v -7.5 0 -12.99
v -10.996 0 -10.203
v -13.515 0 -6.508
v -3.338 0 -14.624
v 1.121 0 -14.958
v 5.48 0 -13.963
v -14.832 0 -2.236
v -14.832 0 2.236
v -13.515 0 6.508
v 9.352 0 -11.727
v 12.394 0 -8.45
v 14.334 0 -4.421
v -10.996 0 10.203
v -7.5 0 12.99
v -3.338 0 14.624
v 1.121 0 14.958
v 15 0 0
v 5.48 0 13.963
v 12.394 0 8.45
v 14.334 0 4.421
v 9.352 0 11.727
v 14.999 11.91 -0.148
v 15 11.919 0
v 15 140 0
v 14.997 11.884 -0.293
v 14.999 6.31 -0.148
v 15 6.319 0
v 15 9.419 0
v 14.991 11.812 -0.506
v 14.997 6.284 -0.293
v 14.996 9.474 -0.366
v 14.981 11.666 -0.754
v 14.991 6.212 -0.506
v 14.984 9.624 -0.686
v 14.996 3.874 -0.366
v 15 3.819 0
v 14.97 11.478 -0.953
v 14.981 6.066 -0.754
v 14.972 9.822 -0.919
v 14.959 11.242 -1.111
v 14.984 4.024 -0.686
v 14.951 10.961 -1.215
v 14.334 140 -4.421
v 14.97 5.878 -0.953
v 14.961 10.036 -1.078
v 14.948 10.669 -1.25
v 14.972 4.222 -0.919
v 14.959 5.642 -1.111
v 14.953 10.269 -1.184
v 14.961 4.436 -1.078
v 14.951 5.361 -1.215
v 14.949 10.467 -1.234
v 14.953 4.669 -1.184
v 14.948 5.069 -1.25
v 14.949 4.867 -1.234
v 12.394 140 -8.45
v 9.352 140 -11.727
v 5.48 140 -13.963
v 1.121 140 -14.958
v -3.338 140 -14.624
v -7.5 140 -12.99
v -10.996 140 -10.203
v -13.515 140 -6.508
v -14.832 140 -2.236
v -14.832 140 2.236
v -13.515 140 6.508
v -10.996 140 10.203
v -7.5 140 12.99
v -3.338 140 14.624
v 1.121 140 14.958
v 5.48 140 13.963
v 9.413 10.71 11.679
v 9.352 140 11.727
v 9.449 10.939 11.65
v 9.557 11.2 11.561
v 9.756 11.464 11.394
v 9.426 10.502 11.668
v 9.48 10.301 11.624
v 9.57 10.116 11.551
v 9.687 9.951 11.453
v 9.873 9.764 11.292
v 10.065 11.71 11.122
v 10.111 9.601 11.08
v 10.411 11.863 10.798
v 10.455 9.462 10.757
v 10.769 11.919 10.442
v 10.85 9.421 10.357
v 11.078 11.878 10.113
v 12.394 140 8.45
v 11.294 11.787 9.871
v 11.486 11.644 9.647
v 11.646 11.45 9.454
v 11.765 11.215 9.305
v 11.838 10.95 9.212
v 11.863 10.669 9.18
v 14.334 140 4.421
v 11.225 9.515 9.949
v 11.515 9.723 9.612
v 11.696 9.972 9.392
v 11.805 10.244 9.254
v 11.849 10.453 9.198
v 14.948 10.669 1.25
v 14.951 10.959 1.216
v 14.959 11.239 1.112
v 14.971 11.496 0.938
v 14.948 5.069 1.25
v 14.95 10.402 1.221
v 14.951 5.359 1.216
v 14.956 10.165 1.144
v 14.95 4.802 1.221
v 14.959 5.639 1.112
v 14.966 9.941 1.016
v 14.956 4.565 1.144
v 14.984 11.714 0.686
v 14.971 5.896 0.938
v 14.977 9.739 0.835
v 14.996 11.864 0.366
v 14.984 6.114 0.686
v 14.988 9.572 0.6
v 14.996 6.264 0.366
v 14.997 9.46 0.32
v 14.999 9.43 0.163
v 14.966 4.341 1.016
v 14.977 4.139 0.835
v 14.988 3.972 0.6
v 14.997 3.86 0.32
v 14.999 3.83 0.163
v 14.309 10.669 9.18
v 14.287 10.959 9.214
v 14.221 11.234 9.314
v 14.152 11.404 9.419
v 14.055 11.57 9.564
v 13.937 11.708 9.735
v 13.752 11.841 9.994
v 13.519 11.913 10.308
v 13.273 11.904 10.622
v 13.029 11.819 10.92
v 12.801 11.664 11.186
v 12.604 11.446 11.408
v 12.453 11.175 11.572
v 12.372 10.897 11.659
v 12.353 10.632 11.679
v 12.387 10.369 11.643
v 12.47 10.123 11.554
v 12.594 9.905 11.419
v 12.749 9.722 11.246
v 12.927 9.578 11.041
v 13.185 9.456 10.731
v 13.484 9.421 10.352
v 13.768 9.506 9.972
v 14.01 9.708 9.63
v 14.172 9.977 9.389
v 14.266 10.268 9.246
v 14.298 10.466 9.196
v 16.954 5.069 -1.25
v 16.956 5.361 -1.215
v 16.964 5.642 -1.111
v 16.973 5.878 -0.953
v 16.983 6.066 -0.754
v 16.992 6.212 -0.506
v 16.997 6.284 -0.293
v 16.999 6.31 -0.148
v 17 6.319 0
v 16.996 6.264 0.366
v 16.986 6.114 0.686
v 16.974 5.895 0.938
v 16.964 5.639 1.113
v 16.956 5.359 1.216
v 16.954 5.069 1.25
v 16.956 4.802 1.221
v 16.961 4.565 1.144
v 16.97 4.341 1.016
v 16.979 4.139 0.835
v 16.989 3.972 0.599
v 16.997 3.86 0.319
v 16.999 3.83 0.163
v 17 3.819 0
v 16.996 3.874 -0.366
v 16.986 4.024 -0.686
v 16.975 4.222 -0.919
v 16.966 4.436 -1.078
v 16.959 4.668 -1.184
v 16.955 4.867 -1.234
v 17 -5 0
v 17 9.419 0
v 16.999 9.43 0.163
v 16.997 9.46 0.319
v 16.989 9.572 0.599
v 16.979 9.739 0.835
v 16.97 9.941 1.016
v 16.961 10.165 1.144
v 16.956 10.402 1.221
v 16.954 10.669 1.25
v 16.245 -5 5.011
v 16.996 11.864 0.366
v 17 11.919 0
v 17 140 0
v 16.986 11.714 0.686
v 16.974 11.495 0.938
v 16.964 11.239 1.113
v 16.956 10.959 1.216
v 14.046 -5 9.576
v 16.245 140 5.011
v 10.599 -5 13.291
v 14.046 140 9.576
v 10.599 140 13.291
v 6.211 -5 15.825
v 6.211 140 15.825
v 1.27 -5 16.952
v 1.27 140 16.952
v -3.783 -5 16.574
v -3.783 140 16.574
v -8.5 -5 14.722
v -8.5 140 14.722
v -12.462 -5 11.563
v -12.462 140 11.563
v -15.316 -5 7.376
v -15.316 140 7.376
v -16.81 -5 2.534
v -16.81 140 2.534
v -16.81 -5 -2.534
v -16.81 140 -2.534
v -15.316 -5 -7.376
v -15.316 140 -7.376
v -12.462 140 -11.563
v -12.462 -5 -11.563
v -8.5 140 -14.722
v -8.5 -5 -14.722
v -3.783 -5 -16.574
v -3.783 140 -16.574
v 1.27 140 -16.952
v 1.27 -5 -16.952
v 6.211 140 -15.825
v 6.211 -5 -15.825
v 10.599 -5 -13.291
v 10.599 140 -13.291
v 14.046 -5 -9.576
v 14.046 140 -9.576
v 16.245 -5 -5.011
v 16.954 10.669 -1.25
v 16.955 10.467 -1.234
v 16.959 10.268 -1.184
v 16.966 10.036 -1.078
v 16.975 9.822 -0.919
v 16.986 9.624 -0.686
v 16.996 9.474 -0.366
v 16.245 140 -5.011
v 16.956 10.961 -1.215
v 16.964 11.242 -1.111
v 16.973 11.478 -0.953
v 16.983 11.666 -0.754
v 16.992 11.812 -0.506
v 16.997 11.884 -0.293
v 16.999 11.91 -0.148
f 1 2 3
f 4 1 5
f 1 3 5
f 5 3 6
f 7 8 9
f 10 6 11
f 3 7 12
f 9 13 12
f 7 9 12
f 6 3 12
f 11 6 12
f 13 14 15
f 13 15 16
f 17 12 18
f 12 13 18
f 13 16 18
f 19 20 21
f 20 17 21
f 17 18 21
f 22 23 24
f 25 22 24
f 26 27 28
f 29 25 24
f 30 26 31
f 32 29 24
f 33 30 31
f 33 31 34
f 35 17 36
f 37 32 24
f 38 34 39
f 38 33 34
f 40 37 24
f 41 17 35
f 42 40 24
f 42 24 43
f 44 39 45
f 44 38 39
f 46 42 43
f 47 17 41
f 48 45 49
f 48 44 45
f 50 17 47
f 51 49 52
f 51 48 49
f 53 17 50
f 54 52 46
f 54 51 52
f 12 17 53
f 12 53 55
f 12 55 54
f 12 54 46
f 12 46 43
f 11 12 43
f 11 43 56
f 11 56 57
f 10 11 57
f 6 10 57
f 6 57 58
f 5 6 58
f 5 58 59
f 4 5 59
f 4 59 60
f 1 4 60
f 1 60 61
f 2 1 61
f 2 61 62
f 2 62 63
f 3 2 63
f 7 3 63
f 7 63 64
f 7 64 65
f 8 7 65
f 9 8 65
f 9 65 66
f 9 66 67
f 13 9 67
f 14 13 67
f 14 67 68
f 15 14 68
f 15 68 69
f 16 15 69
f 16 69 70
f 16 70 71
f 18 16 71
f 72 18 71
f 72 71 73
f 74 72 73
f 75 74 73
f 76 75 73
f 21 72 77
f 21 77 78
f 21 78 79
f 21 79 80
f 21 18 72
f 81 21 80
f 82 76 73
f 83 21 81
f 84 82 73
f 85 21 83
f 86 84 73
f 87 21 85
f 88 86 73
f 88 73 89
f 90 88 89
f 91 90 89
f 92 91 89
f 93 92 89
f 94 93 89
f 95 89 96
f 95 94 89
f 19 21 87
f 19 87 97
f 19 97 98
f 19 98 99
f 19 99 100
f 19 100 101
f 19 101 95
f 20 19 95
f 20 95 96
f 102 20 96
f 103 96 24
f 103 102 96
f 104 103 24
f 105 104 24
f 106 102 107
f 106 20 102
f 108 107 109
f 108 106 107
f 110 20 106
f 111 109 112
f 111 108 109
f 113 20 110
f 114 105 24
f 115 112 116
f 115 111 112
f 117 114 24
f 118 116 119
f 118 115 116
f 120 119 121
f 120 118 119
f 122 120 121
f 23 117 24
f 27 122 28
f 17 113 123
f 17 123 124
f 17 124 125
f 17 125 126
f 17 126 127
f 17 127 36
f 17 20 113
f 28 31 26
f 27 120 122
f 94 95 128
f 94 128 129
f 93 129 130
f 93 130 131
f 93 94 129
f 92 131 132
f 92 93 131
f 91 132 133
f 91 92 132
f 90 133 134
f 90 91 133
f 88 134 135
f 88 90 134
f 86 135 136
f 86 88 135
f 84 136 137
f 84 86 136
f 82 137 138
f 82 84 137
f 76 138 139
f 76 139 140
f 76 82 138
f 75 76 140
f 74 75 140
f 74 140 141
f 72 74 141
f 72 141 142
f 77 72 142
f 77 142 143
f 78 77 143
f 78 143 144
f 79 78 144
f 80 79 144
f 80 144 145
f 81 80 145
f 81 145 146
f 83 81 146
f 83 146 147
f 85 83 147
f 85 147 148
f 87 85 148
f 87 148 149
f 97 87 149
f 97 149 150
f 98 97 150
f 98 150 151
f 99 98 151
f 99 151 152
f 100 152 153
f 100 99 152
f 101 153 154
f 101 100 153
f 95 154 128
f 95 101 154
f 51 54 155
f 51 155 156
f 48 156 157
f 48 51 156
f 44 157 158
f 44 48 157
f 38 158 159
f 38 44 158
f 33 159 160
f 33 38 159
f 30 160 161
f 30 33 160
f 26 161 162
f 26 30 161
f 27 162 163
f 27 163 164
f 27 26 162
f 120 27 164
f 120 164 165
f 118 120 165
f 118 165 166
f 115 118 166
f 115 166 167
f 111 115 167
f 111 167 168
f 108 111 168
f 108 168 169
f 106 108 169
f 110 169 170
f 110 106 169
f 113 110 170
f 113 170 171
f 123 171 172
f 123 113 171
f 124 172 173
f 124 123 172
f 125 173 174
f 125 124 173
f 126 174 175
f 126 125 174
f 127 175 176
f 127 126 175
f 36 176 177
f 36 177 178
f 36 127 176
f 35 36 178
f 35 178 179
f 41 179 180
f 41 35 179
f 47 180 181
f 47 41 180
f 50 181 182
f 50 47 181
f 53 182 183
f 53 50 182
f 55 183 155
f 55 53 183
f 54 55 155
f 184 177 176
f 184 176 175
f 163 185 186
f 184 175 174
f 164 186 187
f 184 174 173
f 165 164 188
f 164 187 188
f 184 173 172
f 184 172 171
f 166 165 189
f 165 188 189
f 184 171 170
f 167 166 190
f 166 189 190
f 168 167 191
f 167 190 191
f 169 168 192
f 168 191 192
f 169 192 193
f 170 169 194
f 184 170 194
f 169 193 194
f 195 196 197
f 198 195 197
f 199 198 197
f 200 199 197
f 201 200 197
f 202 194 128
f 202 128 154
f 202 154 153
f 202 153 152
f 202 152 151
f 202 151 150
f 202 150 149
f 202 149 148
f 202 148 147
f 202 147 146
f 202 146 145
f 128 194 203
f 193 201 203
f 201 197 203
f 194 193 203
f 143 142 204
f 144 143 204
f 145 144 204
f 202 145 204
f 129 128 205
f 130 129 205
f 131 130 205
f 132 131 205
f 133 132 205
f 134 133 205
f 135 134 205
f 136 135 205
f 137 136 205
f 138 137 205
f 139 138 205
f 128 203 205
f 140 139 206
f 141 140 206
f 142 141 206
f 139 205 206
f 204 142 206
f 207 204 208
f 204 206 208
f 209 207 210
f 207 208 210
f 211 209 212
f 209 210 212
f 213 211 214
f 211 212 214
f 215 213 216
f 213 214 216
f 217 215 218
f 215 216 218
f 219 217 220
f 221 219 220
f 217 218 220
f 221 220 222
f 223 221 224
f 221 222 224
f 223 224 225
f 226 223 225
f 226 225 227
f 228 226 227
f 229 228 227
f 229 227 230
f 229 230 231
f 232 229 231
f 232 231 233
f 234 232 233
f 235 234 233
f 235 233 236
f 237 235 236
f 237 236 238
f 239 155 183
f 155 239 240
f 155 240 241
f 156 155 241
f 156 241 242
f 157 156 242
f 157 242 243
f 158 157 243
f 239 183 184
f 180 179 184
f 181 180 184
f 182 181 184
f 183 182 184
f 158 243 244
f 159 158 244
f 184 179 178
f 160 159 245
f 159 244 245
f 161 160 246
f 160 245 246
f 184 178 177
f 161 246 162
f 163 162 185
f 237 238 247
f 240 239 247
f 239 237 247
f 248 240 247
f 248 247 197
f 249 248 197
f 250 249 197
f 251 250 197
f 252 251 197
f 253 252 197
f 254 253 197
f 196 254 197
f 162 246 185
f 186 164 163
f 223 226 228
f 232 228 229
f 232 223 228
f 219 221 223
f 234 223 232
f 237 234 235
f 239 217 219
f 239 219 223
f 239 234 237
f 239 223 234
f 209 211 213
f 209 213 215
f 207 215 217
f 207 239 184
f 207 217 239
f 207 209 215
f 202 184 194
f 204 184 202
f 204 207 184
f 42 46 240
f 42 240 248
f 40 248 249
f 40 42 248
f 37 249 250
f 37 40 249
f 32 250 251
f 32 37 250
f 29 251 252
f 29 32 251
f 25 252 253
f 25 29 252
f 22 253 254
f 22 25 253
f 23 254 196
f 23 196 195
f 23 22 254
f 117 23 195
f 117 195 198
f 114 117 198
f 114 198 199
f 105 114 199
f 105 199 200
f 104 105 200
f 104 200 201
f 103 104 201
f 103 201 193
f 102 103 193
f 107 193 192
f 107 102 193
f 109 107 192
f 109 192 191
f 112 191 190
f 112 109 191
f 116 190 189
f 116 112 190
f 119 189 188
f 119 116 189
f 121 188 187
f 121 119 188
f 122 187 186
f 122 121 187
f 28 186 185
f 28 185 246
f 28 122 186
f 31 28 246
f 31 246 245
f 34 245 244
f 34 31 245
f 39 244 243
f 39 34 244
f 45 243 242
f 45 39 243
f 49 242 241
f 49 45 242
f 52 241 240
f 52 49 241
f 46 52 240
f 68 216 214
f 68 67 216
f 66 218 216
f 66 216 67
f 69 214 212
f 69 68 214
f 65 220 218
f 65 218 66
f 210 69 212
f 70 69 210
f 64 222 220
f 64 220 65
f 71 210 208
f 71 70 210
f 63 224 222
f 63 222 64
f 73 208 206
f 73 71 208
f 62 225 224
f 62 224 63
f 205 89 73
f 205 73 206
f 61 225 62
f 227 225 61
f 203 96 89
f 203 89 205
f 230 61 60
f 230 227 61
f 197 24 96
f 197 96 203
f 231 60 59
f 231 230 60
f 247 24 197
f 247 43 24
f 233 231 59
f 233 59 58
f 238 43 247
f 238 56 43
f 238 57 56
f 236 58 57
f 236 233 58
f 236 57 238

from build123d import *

# Parameters (mm, degrees)
SKETCH1_R           = 17
SKETCH1_R_2         = 15
BOSS_EXTRUDE1_DEPTH = 140
SKETCH2_R           = 17
BOSS_EXTRUDE2_DEPTH = 5
SKETCH3_R           = 1.25
CUT_EXTRUDE1_DEPTH  = 18


with BuildPart() as part:
    # Sketch1 → Boss-Extrude1 (new body)
    with BuildSketch(Plane(origin=(0, 0, 0), x_dir=(1, 0, 0), z_dir=(0, 1, 0))):
        Circle(SKETCH1_R)
        Circle(SKETCH1_R_2, mode=Mode.SUBTRACT)
    extrude(amount=BOSS_EXTRUDE1_DEPTH)

    # Sketch2 → Boss-Extrude2 (add)
    with BuildSketch(Plane.XZ):
        Circle(SKETCH2_R)
    extrude(amount=BOSS_EXTRUDE2_DEPTH)

    # Sketch3 → Cut-Extrude1 (cut, through all)
    with BuildSketch(Plane(origin=(0, 0, 0), x_dir=(0, 0, -1), z_dir=(1, 0, 0))):
        with Locations((0, 5.068906343)):
            Circle(SKETCH3_R)
        with Locations((0, 10.668906343)):
            Circle(SKETCH3_R)
        with Locations((-10.429605655, 10.668906343)):
            Circle(SKETCH3_R)
    extrude(amount=CUT_EXTRUDE1_DEPTH, mode=Mode.SUBTRACT)


solid = part.part
